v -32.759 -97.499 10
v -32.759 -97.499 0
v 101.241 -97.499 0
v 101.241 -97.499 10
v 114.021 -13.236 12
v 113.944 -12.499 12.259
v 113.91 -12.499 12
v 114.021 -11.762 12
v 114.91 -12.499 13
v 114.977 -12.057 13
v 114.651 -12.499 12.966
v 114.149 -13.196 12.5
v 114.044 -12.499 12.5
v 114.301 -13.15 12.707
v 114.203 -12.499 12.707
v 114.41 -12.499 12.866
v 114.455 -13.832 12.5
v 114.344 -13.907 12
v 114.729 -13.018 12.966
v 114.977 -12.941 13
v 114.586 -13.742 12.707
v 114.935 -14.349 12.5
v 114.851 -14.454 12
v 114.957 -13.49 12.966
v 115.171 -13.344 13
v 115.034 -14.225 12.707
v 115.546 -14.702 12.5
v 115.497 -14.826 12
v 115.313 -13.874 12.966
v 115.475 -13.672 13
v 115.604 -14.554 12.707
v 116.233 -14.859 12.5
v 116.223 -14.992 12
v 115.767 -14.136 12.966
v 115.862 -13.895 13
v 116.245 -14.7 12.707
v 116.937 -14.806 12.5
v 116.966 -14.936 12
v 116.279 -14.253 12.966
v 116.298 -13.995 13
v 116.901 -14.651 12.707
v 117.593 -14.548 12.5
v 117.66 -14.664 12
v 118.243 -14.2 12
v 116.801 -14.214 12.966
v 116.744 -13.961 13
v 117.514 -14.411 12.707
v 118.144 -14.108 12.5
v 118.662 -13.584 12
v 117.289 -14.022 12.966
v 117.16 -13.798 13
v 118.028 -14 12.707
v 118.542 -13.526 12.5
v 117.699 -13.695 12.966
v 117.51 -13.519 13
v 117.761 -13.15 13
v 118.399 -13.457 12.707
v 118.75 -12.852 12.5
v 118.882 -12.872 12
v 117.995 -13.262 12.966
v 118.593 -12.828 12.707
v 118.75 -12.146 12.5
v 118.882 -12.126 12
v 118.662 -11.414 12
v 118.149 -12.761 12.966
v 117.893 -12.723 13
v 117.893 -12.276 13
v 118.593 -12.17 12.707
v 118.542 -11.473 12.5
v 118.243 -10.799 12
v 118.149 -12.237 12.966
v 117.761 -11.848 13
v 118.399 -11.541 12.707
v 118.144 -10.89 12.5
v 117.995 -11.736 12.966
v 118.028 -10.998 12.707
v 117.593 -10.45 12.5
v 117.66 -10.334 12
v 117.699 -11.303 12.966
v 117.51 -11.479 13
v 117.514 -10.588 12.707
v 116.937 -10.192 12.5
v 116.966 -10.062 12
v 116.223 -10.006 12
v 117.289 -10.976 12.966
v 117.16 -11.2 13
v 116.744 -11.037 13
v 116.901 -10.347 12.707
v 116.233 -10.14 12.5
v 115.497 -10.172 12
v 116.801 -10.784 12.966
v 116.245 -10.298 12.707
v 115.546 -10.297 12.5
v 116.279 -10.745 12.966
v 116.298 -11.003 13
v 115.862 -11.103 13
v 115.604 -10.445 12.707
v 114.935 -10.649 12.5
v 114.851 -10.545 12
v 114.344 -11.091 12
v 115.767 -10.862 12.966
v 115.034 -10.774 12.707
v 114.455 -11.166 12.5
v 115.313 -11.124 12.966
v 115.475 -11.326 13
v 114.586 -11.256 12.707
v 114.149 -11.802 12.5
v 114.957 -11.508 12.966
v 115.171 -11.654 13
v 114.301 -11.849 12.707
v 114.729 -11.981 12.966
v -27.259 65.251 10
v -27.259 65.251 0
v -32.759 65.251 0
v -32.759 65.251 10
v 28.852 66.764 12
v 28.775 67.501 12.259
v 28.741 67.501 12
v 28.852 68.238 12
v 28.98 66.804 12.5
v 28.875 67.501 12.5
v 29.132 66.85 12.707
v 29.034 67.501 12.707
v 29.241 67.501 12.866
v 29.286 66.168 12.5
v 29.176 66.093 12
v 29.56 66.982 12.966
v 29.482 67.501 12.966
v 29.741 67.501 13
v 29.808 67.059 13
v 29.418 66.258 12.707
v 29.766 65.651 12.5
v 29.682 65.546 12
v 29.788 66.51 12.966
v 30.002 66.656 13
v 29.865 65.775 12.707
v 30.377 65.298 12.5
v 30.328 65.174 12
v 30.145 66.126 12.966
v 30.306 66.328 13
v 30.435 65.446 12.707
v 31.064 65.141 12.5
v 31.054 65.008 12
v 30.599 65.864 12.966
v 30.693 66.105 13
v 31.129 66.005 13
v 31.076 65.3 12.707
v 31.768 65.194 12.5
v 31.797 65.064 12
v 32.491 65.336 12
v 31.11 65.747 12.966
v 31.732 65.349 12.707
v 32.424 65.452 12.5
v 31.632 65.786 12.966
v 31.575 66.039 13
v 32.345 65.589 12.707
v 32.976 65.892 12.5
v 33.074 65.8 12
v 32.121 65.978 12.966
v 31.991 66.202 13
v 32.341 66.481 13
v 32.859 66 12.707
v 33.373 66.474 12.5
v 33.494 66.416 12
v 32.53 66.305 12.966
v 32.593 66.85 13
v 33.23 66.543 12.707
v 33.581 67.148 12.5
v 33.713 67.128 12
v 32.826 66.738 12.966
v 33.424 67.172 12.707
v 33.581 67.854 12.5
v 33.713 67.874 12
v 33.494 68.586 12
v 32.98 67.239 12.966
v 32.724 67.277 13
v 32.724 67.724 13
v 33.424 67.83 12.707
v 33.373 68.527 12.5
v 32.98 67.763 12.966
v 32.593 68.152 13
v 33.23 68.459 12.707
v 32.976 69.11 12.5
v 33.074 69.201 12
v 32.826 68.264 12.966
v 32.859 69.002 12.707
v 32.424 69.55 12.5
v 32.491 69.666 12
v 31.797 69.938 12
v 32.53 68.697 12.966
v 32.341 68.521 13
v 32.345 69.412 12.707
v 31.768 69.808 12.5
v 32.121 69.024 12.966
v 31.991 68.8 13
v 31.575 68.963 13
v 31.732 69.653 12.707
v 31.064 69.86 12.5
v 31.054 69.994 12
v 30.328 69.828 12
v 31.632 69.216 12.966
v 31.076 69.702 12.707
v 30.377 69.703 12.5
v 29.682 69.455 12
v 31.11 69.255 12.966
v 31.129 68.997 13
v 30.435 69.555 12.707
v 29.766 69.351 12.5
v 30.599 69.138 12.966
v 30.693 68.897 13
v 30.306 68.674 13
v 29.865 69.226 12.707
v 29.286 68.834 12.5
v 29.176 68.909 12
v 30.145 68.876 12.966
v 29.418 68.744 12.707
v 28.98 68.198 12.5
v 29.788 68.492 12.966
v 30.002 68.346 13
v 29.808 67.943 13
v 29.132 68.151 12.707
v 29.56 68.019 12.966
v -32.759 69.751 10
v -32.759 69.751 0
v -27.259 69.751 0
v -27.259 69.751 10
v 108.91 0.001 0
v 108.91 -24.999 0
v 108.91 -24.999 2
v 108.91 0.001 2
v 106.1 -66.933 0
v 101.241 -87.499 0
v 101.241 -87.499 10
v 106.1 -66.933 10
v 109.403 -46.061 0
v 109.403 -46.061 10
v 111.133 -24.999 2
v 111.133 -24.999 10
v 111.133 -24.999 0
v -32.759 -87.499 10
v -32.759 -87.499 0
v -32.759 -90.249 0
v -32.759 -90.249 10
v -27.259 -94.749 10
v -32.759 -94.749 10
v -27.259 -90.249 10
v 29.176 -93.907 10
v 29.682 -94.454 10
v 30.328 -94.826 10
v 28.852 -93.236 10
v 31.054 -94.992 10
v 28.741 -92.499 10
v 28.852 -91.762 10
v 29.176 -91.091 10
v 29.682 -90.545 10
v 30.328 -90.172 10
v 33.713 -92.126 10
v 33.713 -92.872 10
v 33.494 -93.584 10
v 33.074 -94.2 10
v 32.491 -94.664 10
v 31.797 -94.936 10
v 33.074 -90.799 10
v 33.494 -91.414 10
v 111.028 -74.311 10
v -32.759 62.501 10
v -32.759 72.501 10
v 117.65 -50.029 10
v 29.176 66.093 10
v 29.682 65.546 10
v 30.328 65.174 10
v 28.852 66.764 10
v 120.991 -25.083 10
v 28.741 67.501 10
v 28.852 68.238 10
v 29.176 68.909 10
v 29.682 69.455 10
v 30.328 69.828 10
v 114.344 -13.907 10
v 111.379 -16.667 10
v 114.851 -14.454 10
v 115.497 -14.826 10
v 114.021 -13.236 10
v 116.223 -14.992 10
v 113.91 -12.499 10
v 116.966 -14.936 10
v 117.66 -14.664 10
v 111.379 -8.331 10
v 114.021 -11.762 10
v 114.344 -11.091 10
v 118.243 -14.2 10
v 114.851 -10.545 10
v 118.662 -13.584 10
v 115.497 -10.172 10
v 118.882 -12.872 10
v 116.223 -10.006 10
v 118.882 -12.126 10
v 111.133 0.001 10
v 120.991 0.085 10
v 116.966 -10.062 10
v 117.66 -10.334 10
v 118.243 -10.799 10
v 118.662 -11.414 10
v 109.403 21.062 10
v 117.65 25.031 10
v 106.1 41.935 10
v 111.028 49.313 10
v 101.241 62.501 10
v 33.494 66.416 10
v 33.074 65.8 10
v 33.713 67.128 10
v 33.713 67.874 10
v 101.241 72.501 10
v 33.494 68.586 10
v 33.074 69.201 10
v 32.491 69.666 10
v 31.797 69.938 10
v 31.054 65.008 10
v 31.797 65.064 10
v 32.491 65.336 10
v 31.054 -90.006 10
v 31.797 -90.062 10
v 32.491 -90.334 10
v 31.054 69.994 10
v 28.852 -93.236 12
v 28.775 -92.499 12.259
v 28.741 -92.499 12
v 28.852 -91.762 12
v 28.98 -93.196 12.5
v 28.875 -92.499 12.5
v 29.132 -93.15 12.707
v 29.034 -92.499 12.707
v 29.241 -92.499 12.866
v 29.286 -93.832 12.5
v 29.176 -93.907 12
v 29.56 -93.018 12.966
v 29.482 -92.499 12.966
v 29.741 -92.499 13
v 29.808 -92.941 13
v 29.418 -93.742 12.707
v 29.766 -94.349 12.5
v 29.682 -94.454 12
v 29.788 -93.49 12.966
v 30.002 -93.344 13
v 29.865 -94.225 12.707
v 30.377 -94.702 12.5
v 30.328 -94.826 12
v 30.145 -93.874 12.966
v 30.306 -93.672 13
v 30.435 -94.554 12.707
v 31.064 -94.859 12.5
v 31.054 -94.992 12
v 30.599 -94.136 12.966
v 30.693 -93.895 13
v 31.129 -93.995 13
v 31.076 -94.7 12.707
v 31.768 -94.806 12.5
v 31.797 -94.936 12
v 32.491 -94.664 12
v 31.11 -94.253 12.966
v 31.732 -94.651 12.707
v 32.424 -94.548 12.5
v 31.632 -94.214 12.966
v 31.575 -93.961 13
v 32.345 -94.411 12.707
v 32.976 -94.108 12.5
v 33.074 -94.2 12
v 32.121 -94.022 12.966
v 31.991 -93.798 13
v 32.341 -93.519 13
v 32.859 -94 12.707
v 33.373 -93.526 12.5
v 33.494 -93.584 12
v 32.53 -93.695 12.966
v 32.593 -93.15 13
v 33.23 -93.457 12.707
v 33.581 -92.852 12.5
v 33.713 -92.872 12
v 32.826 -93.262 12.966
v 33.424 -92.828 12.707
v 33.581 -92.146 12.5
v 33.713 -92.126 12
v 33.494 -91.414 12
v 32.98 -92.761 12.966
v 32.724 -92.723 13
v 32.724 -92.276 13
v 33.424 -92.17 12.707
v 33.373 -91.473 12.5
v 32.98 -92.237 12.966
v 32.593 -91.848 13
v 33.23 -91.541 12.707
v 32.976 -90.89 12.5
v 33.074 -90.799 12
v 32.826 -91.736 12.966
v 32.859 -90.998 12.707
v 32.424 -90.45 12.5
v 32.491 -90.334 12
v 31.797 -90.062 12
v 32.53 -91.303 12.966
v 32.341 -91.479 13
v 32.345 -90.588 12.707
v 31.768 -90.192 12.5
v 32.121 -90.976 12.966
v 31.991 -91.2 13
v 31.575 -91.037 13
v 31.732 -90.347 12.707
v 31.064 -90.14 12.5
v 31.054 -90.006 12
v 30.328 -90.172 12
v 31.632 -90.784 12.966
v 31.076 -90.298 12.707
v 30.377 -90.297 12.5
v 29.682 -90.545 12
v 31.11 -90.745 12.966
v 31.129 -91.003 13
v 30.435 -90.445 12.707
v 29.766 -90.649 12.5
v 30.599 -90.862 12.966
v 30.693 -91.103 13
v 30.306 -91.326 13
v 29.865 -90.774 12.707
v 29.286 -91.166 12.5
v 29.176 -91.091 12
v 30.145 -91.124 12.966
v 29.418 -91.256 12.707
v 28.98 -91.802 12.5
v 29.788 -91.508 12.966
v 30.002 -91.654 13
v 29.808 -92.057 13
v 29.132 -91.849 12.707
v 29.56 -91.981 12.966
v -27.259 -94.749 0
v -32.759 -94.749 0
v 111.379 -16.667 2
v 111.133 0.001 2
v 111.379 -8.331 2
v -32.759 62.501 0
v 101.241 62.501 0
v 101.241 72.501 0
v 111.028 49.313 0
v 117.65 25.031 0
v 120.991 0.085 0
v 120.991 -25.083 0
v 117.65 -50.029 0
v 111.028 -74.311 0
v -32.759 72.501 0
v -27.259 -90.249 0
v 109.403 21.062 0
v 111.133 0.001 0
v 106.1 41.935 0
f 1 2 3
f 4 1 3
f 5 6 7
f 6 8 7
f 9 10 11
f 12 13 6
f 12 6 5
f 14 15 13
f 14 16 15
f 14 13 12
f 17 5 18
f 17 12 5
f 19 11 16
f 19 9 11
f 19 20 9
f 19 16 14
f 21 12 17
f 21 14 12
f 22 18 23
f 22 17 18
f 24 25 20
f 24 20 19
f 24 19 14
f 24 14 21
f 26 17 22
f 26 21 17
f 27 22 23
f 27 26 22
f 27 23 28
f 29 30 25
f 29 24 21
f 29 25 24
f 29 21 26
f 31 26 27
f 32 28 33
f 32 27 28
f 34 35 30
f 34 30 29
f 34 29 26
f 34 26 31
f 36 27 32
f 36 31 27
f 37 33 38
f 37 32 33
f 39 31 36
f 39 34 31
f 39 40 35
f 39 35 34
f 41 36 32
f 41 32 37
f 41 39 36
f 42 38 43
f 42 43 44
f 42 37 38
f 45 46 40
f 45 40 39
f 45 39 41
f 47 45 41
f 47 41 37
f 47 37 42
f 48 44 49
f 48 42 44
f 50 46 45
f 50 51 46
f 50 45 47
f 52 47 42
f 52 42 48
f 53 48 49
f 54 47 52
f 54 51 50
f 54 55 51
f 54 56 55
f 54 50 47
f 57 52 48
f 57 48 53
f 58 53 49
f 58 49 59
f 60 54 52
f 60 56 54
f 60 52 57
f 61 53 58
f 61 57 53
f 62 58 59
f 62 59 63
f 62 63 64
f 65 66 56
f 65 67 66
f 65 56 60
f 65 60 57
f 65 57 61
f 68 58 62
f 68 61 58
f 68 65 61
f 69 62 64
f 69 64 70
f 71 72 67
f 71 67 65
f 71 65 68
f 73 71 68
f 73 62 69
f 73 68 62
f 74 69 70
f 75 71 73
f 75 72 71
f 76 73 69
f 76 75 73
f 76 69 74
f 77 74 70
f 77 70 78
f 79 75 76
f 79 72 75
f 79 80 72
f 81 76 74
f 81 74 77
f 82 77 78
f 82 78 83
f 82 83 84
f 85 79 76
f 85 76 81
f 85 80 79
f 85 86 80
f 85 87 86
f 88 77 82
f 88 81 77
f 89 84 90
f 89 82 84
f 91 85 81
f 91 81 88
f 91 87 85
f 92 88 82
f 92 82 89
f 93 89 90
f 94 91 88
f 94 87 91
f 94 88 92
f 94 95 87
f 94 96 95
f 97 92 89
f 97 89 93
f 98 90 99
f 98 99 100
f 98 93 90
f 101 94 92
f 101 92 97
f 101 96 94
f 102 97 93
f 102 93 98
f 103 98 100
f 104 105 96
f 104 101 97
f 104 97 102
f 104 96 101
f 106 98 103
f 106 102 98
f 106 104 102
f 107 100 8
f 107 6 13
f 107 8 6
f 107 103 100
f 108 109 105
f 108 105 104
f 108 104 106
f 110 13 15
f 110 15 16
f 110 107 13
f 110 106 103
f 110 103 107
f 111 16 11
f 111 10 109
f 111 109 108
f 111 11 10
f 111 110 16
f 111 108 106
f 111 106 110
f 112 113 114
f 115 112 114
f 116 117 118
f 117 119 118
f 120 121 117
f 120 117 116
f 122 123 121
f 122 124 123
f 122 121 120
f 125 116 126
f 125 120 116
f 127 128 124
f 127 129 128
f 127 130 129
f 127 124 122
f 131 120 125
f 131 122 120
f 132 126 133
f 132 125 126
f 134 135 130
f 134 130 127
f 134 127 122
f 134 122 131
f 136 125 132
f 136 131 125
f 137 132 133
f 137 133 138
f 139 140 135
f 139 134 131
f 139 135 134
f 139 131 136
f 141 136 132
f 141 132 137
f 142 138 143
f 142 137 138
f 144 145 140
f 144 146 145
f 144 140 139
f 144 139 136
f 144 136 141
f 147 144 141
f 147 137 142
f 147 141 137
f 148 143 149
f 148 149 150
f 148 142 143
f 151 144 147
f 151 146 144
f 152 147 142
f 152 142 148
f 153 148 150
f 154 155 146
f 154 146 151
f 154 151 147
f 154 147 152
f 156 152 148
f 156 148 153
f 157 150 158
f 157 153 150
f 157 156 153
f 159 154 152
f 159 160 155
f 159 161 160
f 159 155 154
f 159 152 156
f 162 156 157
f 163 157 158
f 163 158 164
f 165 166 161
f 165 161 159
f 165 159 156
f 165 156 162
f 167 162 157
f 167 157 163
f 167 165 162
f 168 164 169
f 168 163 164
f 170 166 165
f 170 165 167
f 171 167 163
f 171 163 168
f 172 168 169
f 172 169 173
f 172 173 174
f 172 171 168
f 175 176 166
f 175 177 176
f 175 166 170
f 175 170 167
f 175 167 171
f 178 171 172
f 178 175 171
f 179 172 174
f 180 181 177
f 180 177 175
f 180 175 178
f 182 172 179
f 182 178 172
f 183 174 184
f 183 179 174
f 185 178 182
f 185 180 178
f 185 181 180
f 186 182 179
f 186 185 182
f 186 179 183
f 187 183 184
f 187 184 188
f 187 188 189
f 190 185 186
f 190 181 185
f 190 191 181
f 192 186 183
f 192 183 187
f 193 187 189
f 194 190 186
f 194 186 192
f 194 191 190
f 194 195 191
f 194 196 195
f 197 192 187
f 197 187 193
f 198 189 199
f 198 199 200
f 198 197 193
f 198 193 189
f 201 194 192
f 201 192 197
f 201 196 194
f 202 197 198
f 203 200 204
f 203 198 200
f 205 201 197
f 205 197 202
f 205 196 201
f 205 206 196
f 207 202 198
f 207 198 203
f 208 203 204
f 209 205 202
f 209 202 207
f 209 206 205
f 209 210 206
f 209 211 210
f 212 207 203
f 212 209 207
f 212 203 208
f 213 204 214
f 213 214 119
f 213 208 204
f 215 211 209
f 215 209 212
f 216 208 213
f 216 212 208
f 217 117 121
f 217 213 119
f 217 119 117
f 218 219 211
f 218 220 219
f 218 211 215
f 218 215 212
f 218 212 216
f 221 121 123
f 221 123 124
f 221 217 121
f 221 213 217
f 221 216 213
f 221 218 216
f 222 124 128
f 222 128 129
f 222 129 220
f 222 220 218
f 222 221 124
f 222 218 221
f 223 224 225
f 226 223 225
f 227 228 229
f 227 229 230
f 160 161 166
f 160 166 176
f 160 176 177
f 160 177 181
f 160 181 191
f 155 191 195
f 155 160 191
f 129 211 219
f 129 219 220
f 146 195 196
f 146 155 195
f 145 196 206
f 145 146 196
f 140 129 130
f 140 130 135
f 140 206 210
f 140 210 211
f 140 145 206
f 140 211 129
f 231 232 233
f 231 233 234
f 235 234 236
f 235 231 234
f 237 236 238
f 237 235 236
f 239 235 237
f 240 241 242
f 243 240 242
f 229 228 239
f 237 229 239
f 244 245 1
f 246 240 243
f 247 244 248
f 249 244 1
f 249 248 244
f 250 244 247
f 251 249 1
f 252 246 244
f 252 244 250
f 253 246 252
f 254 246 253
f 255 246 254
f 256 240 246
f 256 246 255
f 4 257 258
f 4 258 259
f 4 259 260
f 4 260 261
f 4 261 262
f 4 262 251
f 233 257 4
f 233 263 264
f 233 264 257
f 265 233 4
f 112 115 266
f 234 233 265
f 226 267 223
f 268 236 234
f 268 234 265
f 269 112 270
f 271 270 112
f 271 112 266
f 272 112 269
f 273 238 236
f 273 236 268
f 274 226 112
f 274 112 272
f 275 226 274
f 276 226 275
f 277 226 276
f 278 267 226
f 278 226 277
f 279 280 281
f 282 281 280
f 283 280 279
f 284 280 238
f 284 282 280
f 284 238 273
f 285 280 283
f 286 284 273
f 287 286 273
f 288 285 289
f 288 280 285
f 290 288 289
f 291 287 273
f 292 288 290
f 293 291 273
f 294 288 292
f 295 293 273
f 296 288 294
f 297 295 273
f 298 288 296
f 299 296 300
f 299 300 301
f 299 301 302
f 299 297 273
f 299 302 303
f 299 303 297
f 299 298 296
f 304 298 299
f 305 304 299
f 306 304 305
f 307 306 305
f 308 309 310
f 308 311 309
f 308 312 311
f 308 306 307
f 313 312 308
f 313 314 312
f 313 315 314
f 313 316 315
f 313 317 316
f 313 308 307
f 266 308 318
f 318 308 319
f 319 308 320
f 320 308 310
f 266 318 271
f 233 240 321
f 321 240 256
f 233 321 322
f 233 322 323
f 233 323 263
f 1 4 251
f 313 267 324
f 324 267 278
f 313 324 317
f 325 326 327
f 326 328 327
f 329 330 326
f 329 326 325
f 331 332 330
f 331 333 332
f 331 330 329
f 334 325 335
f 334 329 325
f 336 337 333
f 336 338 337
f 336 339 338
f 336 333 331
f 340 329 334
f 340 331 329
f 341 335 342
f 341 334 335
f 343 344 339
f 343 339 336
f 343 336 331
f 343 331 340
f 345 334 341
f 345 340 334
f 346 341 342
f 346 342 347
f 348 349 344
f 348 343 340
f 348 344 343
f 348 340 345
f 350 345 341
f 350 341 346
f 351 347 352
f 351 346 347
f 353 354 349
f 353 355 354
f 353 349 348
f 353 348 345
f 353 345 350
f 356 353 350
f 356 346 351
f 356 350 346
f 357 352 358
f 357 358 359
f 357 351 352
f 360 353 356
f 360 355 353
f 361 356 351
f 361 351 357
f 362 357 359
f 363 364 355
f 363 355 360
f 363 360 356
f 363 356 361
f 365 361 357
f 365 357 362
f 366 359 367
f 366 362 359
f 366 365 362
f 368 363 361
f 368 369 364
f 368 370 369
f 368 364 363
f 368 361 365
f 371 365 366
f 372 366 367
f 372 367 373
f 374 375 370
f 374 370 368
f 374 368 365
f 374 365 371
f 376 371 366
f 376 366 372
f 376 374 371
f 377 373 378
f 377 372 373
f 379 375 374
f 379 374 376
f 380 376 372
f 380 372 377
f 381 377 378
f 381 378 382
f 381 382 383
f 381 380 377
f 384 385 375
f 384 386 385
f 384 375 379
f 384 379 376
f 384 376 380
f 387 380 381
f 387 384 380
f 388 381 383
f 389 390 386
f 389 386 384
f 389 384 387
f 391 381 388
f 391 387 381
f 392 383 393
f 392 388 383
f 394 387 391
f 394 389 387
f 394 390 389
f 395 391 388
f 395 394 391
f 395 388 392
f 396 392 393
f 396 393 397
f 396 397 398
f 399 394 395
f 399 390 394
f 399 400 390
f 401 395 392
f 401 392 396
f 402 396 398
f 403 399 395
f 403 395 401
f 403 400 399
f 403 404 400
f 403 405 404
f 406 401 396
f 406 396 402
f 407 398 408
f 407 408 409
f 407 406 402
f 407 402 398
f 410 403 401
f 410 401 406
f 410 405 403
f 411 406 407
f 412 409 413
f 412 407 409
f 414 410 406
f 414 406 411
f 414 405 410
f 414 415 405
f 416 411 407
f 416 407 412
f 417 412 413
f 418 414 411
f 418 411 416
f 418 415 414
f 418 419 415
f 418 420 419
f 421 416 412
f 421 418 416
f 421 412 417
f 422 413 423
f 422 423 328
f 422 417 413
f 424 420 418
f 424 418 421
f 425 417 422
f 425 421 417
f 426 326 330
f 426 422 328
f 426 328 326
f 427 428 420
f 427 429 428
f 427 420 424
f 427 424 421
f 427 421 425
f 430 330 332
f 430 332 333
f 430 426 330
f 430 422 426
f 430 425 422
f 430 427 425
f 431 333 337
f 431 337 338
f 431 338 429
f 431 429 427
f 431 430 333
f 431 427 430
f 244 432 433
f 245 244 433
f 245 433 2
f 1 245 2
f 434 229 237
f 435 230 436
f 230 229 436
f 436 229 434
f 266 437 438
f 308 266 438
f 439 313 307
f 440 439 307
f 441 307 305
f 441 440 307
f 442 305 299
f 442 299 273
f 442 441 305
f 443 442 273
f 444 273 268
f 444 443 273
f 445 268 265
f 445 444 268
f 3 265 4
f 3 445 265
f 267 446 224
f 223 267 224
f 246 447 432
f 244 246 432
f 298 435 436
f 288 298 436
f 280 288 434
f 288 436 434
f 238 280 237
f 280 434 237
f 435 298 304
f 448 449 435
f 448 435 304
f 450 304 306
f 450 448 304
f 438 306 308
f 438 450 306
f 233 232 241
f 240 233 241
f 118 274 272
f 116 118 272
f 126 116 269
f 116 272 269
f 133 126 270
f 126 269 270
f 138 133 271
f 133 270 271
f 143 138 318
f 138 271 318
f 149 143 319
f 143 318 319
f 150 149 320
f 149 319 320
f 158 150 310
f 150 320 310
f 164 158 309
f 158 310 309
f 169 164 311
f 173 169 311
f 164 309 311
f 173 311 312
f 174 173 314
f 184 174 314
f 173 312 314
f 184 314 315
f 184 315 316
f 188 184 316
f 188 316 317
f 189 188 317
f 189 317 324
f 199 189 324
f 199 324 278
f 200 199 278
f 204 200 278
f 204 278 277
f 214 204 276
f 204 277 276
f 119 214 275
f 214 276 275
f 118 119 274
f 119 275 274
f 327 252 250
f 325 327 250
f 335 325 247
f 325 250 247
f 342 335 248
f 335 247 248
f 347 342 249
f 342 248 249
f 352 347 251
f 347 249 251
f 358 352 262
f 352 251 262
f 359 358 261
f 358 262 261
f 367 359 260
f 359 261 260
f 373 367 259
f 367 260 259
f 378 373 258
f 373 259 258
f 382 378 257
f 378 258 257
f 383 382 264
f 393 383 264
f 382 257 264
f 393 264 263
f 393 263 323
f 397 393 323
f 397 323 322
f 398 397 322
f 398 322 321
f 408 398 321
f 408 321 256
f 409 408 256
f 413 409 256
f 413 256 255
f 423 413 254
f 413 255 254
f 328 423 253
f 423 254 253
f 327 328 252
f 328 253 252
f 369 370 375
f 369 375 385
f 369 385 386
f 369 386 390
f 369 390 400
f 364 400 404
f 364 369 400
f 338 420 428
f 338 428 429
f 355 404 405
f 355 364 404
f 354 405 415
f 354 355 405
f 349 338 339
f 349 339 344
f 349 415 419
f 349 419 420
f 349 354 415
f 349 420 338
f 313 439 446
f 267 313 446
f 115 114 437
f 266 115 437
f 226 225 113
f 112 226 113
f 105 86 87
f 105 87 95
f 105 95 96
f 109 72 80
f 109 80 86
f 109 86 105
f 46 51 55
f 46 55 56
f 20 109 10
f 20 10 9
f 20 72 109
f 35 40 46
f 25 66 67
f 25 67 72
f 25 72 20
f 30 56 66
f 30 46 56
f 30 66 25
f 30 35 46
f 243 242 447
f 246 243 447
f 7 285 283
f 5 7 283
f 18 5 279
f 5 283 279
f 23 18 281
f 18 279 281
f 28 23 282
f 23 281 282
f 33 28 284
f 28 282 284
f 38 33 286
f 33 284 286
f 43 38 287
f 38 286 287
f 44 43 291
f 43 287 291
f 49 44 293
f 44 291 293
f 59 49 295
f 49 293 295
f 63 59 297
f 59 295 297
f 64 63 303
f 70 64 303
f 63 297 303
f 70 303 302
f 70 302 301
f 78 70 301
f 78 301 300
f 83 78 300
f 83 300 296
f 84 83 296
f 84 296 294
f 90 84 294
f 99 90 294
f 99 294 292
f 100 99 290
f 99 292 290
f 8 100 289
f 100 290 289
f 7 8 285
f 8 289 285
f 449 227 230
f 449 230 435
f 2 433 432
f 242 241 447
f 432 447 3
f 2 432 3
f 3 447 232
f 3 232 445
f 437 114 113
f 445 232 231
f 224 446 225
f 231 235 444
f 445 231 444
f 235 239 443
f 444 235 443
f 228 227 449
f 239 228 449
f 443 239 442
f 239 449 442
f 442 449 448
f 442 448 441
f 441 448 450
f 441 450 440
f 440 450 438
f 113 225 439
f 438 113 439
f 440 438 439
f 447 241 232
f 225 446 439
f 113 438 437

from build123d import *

# Parameters (mm, degrees)
ESQUISSE1_R        = 2.5
BOSS_EXTRU_1_DEPTH = 10
ESQUISSE1_3_R      = 2.5
BOSS_EXTRU_2_DEPTH = 13
CONG_1_R           = 1
ESQUISSE1_4_W      = 3
ESQUISSE1_4_H      = 25
BOSS_EXTRU_3_DEPTH = 2


with BuildPart() as part:
    # Esquisse1 → Boss.-Extru.1 (new body)
    with BuildSketch(Plane.XY):
        with BuildLine():
            Line((-32.758882294, 65.250907441), (-32.758882294, 62.500907441))
            Line((-32.758882294, 62.500907441), (101.241117706, 62.500907441))
            ThreePointArc((101.241117706, 62.500907441), (111.410045947, -12.499092559), (101.241117706, -87.499092559))
            Line((101.241117706, -87.499092559), (-32.758882294, -87.499092559))
            Line((-32.758882294, -87.499092559), (-32.758882294, -90.249092559))
            Line((-32.758882294, -90.249092559), (-27.258882294, -90.249092559))
            Line((-27.258882294, -90.249092559), (-27.258882294, -94.749092559))
            Line((-27.258882294, -94.749092559), (-32.758882294, -94.749092559))
            Line((-32.758882294, -94.749092559), (-32.758882294, -97.499092559))
            Line((-32.758882294, -97.499092559), (101.241117706, -97.499092559))
            ThreePointArc((101.241117706, -97.499092559), (121.410045947, -12.499092559), (101.241117706, 72.500907441))
            Line((101.241117706, 72.500907441), (-32.758882294, 72.500907441))
            Line((-32.758882294, 72.500907441), (-32.758882294, 69.750907441))
            Line((-32.758882294, 69.750907441), (-27.258882294, 69.750907441))
            Line((-27.258882294, 69.750907441), (-27.258882294, 65.250907441))
            Line((-27.258882294, 65.250907441), (-32.758882294, 65.250907441))
        make_face()
        with Locations((31.241117706, 67.500907441)):
            Circle(ESQUISSE1_R, mode=Mode.SUBTRACT)
        with Locations((116.410045947, -12.499092559)):
            Circle(ESQUISSE1_R, mode=Mode.SUBTRACT)
        with Locations((31.241117706, -92.499092559)):
            Circle(ESQUISSE1_R, mode=Mode.SUBTRACT)
    extrude(amount=BOSS_EXTRU_1_DEPTH)

    # Esquisse1<3> → Boss.-Extru.2 (add)
    with BuildSketch(Plane.XY):
        with Locations((116.410045947, -12.499092559)):
            Circle(ESQUISSE1_3_R)
        with Locations((31.241117706, 67.500907441)):
            Circle(ESQUISSE1_3_R)
        with Locations((31.241117706, -92.499092559)):
            Circle(ESQUISSE1_3_R)
    extrude(amount=BOSS_EXTRU_2_DEPTH)

    # Congé1
    cong_1_edges = [part.edges().sort_by_distance(p)[0] for p in [
        (28.741117706, 67.500907441, 13),
        (28.741117706, -92.499092559, 13),
        (113.910045947, -12.499092559, 13),
    ]]
    fillet(cong_1_edges, radius=CONG_1_R)

    # Esquisse1<4> → Boss.-Extru.3 (add)
    with BuildSketch(Plane.XY):
        with Locations((110.410045947, -12.499092559)):
            Rectangle(ESQUISSE1_4_W, ESQUISSE1_4_H)
    extrude(amount=BOSS_EXTRU_3_DEPTH)


solid = part.part
